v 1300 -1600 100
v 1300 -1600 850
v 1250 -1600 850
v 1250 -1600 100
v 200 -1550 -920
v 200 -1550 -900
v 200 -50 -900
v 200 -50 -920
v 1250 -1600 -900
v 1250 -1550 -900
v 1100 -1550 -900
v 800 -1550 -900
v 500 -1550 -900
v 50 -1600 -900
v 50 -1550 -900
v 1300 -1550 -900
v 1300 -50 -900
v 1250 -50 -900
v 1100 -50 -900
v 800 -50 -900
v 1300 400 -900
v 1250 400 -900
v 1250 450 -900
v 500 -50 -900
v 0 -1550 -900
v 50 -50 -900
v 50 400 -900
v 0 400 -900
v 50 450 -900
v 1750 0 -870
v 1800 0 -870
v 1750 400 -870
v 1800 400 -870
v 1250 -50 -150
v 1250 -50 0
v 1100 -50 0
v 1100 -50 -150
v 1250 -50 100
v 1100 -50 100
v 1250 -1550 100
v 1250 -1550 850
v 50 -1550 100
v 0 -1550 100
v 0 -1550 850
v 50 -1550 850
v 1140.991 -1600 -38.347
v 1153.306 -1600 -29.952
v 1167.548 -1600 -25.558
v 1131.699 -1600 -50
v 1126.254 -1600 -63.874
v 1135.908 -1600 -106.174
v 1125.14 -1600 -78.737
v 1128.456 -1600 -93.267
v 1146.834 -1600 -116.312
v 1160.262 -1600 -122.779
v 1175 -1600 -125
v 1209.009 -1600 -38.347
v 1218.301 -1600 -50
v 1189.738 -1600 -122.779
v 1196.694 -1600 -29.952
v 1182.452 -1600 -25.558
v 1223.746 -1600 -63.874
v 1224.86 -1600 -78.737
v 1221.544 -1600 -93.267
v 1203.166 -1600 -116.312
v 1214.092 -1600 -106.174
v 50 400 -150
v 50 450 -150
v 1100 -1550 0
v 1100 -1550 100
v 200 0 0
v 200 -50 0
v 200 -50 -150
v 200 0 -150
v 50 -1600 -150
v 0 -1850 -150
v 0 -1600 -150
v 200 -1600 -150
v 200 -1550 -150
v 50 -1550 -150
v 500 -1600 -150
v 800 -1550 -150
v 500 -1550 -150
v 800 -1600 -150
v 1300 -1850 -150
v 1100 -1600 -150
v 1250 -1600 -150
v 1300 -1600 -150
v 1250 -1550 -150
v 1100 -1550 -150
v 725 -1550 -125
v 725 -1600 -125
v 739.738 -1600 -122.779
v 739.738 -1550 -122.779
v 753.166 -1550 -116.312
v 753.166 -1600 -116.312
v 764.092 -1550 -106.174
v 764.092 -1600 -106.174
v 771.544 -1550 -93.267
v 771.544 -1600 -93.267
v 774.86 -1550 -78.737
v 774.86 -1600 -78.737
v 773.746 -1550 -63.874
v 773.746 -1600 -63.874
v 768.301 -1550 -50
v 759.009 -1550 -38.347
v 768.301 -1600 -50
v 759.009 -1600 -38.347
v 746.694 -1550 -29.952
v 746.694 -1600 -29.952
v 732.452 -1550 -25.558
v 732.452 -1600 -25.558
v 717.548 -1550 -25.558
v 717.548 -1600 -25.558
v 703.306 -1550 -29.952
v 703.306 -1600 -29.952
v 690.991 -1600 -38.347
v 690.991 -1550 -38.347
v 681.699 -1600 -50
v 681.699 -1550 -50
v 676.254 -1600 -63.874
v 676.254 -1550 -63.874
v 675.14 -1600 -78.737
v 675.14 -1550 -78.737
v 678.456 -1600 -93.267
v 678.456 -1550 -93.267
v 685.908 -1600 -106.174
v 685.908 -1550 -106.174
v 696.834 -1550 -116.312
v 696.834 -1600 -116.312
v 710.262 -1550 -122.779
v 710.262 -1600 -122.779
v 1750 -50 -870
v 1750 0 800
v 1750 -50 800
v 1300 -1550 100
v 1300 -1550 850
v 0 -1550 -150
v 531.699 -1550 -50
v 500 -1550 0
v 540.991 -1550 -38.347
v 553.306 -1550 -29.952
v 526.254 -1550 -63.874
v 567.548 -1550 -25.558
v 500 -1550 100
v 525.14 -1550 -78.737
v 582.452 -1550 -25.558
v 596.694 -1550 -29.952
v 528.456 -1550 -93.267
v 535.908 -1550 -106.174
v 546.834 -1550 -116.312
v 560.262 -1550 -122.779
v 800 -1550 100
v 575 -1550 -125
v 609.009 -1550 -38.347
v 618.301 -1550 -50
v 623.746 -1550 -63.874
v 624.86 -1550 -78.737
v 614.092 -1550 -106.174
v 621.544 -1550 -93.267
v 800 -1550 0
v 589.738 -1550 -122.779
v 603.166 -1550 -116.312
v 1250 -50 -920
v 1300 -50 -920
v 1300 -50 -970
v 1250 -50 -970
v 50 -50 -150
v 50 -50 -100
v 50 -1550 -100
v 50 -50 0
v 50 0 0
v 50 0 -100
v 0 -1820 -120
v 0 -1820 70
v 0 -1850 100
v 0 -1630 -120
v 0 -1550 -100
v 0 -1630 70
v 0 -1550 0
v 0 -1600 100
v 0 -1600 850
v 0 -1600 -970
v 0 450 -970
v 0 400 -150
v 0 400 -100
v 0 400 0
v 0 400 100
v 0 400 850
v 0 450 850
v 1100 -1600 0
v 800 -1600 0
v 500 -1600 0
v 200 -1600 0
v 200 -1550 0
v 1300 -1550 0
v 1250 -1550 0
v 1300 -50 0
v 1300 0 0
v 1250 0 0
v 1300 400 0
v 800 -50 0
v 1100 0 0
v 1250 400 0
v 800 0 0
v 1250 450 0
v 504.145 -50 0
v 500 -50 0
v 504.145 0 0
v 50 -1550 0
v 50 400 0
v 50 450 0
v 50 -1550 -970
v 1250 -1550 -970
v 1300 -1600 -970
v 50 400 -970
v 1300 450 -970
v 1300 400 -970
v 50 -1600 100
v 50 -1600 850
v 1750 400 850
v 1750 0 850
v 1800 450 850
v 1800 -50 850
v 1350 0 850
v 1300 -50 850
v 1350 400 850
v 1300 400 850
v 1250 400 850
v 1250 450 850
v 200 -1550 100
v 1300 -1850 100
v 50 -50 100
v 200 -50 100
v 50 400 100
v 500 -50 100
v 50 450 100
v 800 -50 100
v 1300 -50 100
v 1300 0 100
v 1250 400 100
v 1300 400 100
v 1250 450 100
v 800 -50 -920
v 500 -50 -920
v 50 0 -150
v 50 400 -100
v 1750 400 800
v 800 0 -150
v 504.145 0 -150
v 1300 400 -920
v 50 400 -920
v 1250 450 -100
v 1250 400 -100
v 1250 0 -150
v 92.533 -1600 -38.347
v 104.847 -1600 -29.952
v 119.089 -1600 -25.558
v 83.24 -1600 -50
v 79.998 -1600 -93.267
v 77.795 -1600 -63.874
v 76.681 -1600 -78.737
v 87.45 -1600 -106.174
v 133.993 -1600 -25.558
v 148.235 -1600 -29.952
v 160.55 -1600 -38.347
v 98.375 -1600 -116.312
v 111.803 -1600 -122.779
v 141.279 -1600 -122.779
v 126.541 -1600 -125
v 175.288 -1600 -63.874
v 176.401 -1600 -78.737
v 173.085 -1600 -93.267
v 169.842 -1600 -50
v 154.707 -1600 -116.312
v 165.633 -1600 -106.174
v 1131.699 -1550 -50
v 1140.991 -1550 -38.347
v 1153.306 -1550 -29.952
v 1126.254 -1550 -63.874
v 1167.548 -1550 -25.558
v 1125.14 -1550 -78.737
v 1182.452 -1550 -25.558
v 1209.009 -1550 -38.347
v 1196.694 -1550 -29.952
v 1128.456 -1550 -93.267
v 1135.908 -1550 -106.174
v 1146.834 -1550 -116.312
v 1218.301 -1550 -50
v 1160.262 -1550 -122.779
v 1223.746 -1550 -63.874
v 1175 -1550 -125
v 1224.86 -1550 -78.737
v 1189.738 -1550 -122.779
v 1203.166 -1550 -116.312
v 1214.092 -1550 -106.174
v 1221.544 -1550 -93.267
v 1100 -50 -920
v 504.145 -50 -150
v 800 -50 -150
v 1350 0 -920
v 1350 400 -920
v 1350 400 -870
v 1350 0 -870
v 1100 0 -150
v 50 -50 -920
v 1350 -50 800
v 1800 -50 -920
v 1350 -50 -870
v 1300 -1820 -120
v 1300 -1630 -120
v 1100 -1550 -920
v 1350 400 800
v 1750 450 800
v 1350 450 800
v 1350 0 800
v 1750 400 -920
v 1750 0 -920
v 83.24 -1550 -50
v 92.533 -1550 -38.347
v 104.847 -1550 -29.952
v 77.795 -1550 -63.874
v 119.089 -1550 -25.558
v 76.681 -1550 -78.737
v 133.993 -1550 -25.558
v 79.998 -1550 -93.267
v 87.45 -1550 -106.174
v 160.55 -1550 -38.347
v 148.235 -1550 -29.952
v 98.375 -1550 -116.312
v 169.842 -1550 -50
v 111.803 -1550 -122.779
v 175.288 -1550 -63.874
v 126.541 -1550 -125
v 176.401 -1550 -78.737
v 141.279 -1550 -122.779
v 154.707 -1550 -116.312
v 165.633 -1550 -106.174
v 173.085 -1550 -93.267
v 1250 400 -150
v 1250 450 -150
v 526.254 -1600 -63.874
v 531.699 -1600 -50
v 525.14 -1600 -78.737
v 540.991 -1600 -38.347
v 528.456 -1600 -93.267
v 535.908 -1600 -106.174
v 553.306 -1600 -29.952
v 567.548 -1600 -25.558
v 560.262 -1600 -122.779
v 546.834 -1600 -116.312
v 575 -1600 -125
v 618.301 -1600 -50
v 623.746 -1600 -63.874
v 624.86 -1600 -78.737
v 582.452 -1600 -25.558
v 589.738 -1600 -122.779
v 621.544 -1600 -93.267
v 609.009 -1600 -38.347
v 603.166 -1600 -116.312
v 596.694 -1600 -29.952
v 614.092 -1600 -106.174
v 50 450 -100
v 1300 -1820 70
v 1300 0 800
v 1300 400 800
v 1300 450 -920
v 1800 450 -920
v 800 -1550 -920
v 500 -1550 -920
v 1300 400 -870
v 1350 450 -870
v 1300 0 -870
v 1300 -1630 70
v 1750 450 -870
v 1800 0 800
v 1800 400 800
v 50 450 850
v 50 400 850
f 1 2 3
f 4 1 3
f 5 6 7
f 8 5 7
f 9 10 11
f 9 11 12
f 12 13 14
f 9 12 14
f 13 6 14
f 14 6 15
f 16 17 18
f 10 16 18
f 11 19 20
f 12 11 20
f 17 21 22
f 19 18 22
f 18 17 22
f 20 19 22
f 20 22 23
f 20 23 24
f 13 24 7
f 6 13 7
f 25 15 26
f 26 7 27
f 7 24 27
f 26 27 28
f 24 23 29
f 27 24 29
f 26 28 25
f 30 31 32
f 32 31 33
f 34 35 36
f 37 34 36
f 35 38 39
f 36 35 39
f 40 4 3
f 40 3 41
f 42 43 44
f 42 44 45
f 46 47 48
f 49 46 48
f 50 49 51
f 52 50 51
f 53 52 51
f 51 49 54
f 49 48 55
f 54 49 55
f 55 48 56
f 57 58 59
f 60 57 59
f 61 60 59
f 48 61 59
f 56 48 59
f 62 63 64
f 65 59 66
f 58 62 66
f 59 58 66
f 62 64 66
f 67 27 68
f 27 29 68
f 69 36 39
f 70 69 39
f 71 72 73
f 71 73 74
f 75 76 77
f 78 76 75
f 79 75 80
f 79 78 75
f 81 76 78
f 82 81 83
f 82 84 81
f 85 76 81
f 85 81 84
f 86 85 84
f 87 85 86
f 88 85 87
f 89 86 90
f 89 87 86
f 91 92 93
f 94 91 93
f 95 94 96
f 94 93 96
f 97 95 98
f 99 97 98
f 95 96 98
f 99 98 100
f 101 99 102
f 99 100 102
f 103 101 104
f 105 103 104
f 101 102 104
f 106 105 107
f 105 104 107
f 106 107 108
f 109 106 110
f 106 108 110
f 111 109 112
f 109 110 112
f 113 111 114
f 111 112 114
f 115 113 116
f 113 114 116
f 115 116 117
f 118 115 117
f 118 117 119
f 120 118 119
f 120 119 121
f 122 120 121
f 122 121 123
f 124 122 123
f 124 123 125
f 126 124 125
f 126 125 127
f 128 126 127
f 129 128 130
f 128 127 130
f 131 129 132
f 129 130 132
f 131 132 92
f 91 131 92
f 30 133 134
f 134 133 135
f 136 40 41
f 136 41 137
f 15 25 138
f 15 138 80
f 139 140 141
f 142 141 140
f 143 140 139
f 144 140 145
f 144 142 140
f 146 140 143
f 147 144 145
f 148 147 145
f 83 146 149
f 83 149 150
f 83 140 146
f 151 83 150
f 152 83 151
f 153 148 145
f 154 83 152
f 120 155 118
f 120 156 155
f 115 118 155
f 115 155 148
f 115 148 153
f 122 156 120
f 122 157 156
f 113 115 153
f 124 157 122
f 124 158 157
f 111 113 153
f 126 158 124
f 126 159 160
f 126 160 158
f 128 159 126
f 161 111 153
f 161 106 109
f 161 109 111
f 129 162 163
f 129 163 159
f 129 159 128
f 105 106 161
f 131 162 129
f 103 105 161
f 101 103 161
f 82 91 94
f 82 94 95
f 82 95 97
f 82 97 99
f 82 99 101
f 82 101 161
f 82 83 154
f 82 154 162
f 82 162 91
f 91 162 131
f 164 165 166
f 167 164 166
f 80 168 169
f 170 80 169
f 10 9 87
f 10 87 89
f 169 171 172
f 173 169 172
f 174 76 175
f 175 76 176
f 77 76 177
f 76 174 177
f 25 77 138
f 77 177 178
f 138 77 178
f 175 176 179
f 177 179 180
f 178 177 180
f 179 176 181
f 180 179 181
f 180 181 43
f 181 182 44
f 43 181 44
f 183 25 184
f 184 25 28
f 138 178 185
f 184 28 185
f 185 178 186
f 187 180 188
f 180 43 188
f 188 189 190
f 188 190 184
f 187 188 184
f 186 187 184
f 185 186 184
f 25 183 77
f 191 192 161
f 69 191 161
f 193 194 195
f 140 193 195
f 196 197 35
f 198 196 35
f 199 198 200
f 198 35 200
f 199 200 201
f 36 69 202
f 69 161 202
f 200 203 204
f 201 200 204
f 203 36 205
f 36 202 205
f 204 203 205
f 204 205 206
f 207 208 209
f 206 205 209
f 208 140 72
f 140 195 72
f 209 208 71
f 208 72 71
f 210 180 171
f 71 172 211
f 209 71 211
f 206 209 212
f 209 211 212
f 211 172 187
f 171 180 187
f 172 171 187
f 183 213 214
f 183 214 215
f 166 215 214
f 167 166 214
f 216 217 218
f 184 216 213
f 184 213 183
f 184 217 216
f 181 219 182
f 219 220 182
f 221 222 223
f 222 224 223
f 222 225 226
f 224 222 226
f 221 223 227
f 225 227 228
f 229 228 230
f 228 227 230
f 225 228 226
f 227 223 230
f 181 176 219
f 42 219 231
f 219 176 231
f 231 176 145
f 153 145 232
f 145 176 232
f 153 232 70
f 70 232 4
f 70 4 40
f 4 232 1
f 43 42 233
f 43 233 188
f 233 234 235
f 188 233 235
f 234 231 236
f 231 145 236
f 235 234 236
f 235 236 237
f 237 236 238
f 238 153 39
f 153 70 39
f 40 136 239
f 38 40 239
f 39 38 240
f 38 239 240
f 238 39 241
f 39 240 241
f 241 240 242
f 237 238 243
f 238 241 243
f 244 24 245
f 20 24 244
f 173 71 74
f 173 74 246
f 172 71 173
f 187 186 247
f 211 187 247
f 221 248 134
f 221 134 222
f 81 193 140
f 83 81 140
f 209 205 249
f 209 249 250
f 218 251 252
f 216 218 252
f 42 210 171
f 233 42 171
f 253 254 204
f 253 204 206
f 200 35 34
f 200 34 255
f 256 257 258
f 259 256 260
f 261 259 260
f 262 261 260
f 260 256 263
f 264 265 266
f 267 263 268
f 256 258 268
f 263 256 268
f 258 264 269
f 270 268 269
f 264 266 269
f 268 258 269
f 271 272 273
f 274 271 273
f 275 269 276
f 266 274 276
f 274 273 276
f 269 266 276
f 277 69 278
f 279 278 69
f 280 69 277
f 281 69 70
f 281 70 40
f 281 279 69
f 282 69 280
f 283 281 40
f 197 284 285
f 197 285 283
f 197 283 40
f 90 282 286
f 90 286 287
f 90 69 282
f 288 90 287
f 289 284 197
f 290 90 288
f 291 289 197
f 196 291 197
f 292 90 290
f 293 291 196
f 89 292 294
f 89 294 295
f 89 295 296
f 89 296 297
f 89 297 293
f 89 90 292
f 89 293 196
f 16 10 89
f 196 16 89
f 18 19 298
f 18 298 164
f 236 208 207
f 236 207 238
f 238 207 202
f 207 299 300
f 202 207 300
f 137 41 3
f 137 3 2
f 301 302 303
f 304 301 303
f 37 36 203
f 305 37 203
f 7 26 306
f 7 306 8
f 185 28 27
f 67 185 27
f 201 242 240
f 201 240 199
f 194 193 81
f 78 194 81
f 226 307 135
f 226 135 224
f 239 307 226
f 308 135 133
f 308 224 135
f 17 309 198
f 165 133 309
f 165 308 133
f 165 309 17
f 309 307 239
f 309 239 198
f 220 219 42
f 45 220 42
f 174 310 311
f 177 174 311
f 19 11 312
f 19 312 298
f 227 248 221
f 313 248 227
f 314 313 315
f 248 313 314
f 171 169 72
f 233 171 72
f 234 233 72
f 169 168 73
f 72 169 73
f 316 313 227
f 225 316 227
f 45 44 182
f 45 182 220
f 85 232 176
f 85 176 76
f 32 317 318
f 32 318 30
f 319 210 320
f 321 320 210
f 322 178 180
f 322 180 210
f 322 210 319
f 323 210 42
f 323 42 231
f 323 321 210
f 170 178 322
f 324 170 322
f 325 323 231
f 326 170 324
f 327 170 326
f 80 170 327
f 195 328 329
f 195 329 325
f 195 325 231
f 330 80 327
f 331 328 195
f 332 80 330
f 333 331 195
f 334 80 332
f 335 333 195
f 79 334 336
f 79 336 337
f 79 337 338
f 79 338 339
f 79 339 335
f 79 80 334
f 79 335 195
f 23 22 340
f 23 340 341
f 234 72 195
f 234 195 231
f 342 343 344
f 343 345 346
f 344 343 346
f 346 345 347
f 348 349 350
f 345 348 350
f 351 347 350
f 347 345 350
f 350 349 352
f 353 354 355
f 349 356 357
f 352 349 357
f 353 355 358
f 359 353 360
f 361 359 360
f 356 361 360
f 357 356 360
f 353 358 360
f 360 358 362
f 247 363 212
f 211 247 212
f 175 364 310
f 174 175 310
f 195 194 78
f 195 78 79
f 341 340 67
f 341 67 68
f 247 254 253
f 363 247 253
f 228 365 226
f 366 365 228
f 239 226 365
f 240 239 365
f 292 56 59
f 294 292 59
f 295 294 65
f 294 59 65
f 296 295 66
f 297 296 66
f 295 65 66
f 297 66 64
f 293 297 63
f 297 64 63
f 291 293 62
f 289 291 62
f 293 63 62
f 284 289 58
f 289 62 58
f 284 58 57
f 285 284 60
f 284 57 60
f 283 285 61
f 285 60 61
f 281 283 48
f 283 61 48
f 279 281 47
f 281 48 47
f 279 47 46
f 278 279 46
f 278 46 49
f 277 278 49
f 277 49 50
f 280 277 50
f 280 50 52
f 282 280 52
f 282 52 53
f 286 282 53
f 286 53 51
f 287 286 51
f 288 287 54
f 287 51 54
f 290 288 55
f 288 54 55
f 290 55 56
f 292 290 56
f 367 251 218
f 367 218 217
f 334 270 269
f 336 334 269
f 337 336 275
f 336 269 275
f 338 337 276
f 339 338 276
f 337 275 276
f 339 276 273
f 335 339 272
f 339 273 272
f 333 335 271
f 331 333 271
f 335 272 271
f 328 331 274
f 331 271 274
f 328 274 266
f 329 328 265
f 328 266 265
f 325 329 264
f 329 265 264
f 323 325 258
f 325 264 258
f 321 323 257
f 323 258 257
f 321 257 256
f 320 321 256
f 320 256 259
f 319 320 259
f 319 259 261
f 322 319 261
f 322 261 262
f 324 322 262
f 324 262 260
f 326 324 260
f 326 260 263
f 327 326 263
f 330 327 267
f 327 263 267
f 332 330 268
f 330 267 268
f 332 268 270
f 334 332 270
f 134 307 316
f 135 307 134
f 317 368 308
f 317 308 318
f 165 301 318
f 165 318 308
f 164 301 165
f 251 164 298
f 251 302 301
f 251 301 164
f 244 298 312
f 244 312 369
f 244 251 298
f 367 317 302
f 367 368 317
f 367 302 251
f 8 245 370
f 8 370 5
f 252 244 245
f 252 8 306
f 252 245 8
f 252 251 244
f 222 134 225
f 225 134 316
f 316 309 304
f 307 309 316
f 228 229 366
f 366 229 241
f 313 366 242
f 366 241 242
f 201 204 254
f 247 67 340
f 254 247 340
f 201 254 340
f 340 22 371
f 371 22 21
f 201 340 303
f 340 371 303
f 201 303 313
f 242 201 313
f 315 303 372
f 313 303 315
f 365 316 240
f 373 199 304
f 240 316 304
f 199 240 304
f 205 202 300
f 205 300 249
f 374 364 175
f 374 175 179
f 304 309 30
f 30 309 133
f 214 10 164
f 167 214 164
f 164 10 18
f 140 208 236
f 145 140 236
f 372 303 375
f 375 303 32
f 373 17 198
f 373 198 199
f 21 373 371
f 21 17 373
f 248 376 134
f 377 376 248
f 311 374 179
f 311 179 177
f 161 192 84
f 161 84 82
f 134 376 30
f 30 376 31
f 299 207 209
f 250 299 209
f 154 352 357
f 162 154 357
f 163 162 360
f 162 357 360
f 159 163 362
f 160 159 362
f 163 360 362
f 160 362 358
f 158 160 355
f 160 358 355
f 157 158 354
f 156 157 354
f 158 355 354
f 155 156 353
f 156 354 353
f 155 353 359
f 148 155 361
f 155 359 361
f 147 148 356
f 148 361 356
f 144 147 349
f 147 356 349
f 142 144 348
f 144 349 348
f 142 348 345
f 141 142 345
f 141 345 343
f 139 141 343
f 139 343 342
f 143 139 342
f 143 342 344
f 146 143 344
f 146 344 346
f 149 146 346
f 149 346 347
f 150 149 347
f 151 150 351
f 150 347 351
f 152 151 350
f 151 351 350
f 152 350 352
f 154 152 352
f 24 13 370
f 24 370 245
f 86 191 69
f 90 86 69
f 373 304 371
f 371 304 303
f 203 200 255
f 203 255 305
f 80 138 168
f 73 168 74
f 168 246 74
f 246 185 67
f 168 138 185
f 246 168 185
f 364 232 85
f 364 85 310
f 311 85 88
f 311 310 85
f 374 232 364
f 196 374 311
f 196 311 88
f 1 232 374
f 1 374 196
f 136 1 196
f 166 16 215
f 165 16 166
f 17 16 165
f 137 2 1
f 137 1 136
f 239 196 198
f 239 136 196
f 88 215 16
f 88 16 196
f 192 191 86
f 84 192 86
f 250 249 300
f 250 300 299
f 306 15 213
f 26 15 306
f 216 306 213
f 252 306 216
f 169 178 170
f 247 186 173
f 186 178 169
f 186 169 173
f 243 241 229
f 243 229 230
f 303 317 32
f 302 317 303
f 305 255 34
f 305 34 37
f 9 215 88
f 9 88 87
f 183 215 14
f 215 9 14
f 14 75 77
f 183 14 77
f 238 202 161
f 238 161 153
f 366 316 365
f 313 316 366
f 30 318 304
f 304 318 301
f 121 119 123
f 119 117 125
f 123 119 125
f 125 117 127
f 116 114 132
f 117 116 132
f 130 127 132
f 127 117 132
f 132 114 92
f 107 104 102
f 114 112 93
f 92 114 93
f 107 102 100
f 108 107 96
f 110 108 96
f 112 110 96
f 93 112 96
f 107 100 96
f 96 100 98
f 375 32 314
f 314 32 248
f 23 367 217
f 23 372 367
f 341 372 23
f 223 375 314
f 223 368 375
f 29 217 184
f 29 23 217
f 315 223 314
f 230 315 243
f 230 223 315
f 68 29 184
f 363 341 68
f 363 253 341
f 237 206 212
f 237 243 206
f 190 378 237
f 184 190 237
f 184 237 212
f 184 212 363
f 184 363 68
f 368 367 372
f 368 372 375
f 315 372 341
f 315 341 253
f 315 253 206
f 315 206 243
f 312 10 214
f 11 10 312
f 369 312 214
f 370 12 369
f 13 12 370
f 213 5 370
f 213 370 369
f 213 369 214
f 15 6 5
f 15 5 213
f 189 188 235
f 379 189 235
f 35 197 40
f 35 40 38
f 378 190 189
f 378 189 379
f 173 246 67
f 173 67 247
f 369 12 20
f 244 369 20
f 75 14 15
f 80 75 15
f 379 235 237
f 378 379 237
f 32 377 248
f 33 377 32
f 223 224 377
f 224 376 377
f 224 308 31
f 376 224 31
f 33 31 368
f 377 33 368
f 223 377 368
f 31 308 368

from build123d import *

# Parameters (mm, degrees)
SKETCH1_W                = 1300
SKETCH1_H                = 1600
SKETCH1_W_2              = 1200
SKETCH1_H_2              = 1500
BOSS_EXTRUDE1_DEPTH      = 100
SKETCH2_W                = 300
SKETCH2_H                = 100
BOSS_EXTRUDE2_DEPTH      = 1500
SKETCH3_W                = 150
SKETCH3_H                = 50
SKETCH3_W_2              = 295.855328594
SKETCH3_W_3              = 300
BOSS_EXTRUDE3_DEPTH      = 150
SKETCH4_R                = 50
CUT_EXTRUDE1_DEPTH       = 50
SKETCH5_W                = 100
SKETCH5_H                = 450
BOSS_EXTRUDE6_DEPTH      = 1300
BOSS_EXTRUDE7_DEPTH      = 750
BOSS_EXTRUDE7_DEPTH_BACK = 1000
SKETCH6_W                = 50
SKETCH6_H                = 50
SKETCH7_W                = 1300
SKETCH7_H                = 2050
BOSS_EXTRUDE8_DEPTH      = 20
SKETCH8_W                = 150
SKETCH8_H                = 1500
SKETCH8_W_2              = 300
CUT_EXTRUDE2_DEPTH       = 20
SKETCH9_W                = 50
SKETCH9_H                = 50
BOSS_EXTRUDE9_DEPTH      = 1958
SKETCH10_W               = 50
SKETCH10_H               = 50
BOSS_EXTRUDE10_DEPTH     = 1200
SKETCH11_W               = 500
SKETCH11_H               = 500
SKETCH11_W_2             = 400
SKETCH11_H_2             = 400
BOSS_EXTRUDE11_DEPTH     = 1770
SKETCH12_W               = 400
SKETCH12_H               = 1670
CUT_EXTRUDE3_DEPTH       = 500
SKETCH13_W               = 1670
SKETCH13_H               = 400
CUT_EXTRUDE5_DEPTH       = 500
SKETCH14_W               = 250
SKETCH14_H               = 250
SKETCH14_W_2             = 190
SKETCH14_H_2             = 190
BOSS_EXTRUDE12_DEPTH     = 1300
SKETCH15_W               = 1300
SKETCH15_H               = 2050
SKETCH15_W_2             = 1200
SKETCH15_H_2             = 1950
BOSS_EXTRUDE13_DEPTH     = 50
SKETCH16_W               = 50
SKETCH16_H               = 450
CUT_EXTRUDE6_DEPTH       = 50


with BuildPart() as part:
    # Sketch1 → Boss-Extrude1 (new body)
    with BuildSketch(Plane.XY):
        with Locations((650, -800)):
            Rectangle(SKETCH1_W, SKETCH1_H)
        with Locations((650, -800)):
            Rectangle(SKETCH1_W_2, SKETCH1_H_2, mode=Mode.SUBTRACT)
    extrude(amount=BOSS_EXTRUDE1_DEPTH)

    # Sketch2 → Boss-Extrude2 (add)
    with BuildSketch(Plane.XZ.offset(50)):
        with Locations((350, 50)):
            Rectangle(SKETCH2_W, SKETCH2_H)
        with Locations((950, 50)):
            Rectangle(SKETCH2_W, SKETCH2_H)
    extrude(amount=BOSS_EXTRUDE2_DEPTH)

    # Sketch3 → Boss-Extrude3 (add)
    with BuildSketch(Plane(origin=(0, 0, 0), x_dir=(-1, 0, 0), z_dir=(0, 0, -1))):
        with Locations((-1175, -25)):
            Rectangle(SKETCH3_W, SKETCH3_H)
        with Locations((-652.072335703, -25)):
            Rectangle(SKETCH3_W_2, SKETCH3_H)
        with Locations((-125, -25)):
            Rectangle(SKETCH3_W, SKETCH3_H)
        with Locations((-1175, -1575)):
            Rectangle(SKETCH3_W, SKETCH3_H)
        with Locations((-650, -1575)):
            Rectangle(SKETCH3_W_3, SKETCH3_H)
        with Locations((-125, -1575)):
            Rectangle(SKETCH3_W, SKETCH3_H)
    extrude(amount=BOSS_EXTRUDE3_DEPTH)

    # Sketch4 → Cut-Extrude1 (cut)
    with BuildSketch(Plane.XZ.offset(1600)):
        with Locations(Location((1175, -75, 0), (0, 0, 270))):
            Circle(SKETCH4_R)
        with Locations(Location((725, -75, 0), (0, 0, 270))):
            Circle(SKETCH4_R)
        with Locations(Location((575, -75, 0), (0, 0, 270))):
            Circle(SKETCH4_R)
        with Locations(Location((126.541195245, -75, 0), (0, 0, 270))):
            Circle(SKETCH4_R)
    extrude(amount=-CUT_EXTRUDE1_DEPTH, mode=Mode.SUBTRACT)

    # Sketch5 → Boss-Extrude6 (add)
    with BuildSketch(Plane.ZY):
        with Locations((50, 225)):
            Rectangle(SKETCH5_W, SKETCH5_H)
    extrude(amount=-BOSS_EXTRUDE6_DEPTH)

    # Sketch6 → Boss-Extrude7 (add, two sides: drawn at the far end of the back side and taken through both)
    with BuildSketch(Plane.XY.offset(100).offset(-BOSS_EXTRUDE7_DEPTH_BACK)):
        with Locations((25, 425)):
            Rectangle(SKETCH6_W, SKETCH6_H)
        with Locations((1275, 425)):
            Rectangle(SKETCH6_W, SKETCH6_H)
        with Locations((1275, -1575)):
            Rectangle(SKETCH6_W, SKETCH6_H)
        with Locations((25, -1575)):
            Rectangle(SKETCH6_W, SKETCH6_H)
    extrude(amount=BOSS_EXTRUDE7_DEPTH + BOSS_EXTRUDE7_DEPTH_BACK)

    # Sketch7 → Boss-Extrude8 (add)
    with BuildSketch(Plane(origin=(0, 0, -900), x_dir=(-1, 0, 0), z_dir=(0, 0, -1))):
        with Locations((-650, -575)):
            Rectangle(SKETCH7_W, SKETCH7_H)
    extrude(amount=BOSS_EXTRUDE8_DEPTH)

    # Sketch8 → Cut-Extrude2 (cut)
    with BuildSketch(Plane.XY.offset(-900)):
        with Locations((1175, -800)):
            Rectangle(SKETCH8_W, SKETCH8_H)
        with Locations((650, -800)):
            Rectangle(SKETCH8_W_2, SKETCH8_H)
        with Locations((125, -800)):
            Rectangle(SKETCH8_W, SKETCH8_H)
    extrude(amount=-CUT_EXTRUDE2_DEPTH, mode=Mode.SUBTRACT)

    # Sketch9 → Boss-Extrude9 (add)
    with BuildSketch(Plane.XZ.offset(-400)):
        with Locations((25, -125)):
            Rectangle(SKETCH9_W, SKETCH9_H)
    extrude(amount=BOSS_EXTRUDE9_DEPTH)

    # Sketch10 → Boss-Extrude10 (add)
    with BuildSketch(Plane.ZY.offset(-1250)):
        with Locations((-125, 425)):
            Rectangle(SKETCH10_W, SKETCH10_H)
    extrude(amount=BOSS_EXTRUDE10_DEPTH)

    # Sketch11 → Boss-Extrude11 (add)
    with BuildSketch(Plane(origin=(0, 0, -920), x_dir=(-1, 0, 0), z_dir=(0, 0, -1))):
        with Locations((-1550, 200)):
            Rectangle(SKETCH11_W, SKETCH11_H)
        with Locations((-1550, 200)):
            Rectangle(SKETCH11_W_2, SKETCH11_H_2, mode=Mode.SUBTRACT)
    extrude(amount=-BOSS_EXTRUDE11_DEPTH)

    # Sketch12 → Cut-Extrude3 (cut)
    with BuildSketch(Plane.XZ.offset(50)):
        with Locations((1550, -35)):
            Rectangle(SKETCH12_W, SKETCH12_H)
    extrude(amount=-CUT_EXTRUDE3_DEPTH, mode=Mode.SUBTRACT)

    # Sketch13 → Cut-Extrude5 (cut)
    with BuildSketch(Plane(origin=(1800, 0, 0), x_dir=(0, 0, -1), z_dir=(1, 0, 0))):
        with Locations((35, 200)):
            Rectangle(SKETCH13_W, SKETCH13_H)
    extrude(amount=-CUT_EXTRUDE5_DEPTH, mode=Mode.SUBTRACT)

    # Sketch14 → Boss-Extrude12 (add)
    with BuildSketch(Plane(origin=(1300, 0, 0), x_dir=(0, 0, -1), z_dir=(1, 0, 0))):
        with Locations((25, -1725)):
            Rectangle(SKETCH14_W, SKETCH14_H)
        with Locations((25, -1725)):
            Rectangle(SKETCH14_W_2, SKETCH14_H_2, mode=Mode.SUBTRACT)
    extrude(amount=-BOSS_EXTRUDE12_DEPTH)

    # Sketch15 → Boss-Extrude13 (add)
    with BuildSketch(Plane(origin=(0, 0, -920), x_dir=(-1, 0, 0), z_dir=(0, 0, -1))):
        with Locations((-650, -575)):
            Rectangle(SKETCH15_W, SKETCH15_H)
        with Locations((-650, -575)):
            Rectangle(SKETCH15_W_2, SKETCH15_H_2, mode=Mode.SUBTRACT)
    extrude(amount=BOSS_EXTRUDE13_DEPTH)

    # Sketch16 → Cut-Extrude6 (cut)
    with BuildSketch(Plane(origin=(1300, 0, 0), x_dir=(0, 0, -1), z_dir=(1, 0, 0))):
        with Locations((945, 175)):
            Rectangle(SKETCH16_W, SKETCH16_H)
    extrude(amount=-CUT_EXTRUDE6_DEPTH, mode=Mode.SUBTRACT)


solid = part.part
